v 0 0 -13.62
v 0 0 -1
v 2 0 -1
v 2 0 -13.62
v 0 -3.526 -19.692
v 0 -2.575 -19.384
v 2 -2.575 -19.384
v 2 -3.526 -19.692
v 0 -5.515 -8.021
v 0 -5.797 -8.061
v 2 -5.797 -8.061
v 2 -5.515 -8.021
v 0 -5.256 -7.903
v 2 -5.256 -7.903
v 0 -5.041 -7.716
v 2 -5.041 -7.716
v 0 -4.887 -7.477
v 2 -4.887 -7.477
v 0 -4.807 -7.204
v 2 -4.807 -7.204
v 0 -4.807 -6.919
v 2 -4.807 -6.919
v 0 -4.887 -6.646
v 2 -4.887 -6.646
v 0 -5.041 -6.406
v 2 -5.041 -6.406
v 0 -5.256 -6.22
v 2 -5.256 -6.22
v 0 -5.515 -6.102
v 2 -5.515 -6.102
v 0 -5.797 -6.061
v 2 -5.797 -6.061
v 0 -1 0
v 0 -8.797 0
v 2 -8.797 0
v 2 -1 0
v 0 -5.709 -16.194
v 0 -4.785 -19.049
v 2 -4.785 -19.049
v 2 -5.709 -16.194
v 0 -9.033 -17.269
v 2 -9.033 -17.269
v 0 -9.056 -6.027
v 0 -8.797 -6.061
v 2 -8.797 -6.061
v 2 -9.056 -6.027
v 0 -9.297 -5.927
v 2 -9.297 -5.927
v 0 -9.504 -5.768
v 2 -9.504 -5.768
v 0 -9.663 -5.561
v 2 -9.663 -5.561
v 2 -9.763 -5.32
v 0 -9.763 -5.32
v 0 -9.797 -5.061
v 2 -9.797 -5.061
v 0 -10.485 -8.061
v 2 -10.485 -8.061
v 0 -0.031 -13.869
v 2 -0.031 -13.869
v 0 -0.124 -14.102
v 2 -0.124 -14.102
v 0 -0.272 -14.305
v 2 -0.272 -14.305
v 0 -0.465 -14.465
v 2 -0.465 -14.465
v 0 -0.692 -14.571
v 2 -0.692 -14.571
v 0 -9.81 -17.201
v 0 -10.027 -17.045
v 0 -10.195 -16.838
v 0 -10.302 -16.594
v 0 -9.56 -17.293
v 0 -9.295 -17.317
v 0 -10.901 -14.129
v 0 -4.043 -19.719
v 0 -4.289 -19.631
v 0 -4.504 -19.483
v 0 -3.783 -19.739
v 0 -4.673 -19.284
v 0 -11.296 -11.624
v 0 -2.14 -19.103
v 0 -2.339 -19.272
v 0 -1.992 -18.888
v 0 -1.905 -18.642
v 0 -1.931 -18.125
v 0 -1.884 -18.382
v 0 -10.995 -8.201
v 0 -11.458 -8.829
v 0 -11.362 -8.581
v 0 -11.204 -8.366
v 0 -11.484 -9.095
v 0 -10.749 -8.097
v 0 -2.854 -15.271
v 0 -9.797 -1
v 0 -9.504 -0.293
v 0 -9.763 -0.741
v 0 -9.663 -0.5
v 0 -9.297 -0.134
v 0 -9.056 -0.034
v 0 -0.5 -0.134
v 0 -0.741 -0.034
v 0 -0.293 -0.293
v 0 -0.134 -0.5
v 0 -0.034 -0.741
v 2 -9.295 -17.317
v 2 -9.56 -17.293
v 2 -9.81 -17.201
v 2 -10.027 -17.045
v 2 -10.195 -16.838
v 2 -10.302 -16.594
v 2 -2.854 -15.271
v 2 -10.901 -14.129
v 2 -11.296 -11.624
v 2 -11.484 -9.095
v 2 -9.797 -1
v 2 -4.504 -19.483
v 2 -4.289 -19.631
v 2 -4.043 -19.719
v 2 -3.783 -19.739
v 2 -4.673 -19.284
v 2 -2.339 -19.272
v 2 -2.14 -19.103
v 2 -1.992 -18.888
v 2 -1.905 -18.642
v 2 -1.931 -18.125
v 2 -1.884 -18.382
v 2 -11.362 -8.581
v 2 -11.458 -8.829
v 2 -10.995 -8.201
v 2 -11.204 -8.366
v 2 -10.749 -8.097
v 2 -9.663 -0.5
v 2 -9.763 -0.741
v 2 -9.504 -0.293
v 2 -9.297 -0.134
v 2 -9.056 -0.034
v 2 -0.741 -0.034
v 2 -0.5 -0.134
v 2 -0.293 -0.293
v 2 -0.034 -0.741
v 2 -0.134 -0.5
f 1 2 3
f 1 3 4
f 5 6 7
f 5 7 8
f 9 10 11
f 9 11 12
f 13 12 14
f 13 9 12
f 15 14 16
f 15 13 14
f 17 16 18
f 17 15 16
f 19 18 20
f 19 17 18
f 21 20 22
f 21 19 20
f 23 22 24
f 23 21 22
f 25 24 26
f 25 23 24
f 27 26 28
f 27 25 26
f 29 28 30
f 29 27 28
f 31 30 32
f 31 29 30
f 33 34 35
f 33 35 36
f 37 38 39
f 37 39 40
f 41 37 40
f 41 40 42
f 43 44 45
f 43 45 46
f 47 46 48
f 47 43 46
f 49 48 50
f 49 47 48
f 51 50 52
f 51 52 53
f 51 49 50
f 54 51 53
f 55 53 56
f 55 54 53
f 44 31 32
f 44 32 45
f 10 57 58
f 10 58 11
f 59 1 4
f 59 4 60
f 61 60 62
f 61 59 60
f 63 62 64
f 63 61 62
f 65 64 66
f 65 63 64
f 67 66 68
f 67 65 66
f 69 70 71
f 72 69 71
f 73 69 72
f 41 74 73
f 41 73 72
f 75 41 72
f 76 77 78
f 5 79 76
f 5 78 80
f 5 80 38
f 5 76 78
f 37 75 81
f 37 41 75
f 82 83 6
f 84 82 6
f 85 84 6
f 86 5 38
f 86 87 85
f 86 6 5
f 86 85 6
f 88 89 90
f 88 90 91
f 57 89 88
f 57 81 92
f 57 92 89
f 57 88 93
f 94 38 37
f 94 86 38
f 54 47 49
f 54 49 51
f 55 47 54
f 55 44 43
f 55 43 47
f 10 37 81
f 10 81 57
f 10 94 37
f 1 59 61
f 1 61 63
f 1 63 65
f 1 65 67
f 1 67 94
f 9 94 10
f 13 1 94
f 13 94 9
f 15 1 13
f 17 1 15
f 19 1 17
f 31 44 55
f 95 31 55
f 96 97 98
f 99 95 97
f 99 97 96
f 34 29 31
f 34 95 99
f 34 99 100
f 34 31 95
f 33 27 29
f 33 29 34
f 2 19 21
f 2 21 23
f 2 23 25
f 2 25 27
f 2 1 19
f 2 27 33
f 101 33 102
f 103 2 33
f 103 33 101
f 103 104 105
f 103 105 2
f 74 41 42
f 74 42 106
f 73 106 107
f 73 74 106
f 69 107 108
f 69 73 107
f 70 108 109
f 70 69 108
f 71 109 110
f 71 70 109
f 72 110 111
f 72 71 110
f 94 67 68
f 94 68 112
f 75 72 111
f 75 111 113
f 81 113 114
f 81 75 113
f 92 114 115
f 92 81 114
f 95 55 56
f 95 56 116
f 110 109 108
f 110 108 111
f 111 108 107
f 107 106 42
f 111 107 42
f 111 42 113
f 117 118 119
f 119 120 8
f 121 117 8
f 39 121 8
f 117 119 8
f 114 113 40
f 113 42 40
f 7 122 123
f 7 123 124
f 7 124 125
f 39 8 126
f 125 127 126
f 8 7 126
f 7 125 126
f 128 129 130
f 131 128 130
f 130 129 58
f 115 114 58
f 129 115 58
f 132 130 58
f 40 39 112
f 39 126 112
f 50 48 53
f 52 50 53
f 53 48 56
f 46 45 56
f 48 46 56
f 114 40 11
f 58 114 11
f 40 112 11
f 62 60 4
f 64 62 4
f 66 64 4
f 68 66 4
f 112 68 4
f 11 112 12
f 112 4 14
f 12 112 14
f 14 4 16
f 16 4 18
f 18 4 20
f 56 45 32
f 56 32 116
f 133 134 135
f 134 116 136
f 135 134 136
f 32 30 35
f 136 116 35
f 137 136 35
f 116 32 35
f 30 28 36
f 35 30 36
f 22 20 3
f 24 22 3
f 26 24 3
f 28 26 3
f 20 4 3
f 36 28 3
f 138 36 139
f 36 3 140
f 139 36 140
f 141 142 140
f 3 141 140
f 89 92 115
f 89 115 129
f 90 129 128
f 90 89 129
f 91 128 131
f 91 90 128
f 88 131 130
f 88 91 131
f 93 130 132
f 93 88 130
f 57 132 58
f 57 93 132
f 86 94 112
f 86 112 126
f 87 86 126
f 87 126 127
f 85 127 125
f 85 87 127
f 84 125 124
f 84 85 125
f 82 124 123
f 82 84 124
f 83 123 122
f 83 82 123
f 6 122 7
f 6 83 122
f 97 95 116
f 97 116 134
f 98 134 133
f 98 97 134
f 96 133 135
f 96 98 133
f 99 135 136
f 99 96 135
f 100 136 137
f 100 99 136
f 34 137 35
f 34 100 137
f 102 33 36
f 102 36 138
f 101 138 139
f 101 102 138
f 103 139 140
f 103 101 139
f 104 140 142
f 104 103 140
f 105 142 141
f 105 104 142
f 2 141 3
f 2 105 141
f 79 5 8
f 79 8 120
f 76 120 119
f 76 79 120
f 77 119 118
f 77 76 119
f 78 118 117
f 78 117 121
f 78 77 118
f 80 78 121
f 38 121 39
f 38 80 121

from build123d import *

# Parameters (mm, degrees)
RESSALTO_EXTRUS_O1_DEPTH = 2


with BuildPart() as part:
    # Esboço1 → Ressalto-extrusão1 (new body)
    with BuildSketch(Plane(origin=(0, 0, 0), x_dir=(0, 0, -1), z_dir=(1, 0, 0))):
        with BuildLine():
            Line((1, 0), (13.619955174, 0))
            ThreePointArc((13.619955174, 0), (14.20826651, -0.191365489), (14.571412872, -0.692220455))
            Line((14.571412872, -0.692220455), (15.270830572, -2.854373095))
            Line((15.270830572, -2.854373095), (18.125203668, -1.931034461))
            ThreePointArc((18.125203668, -1.931034461), (18.8881324, -1.992076966), (19.384440911, -2.574712615))
            Line((19.384440911, -2.574712615), (19.692220455, -3.526170314))
            ThreePointArc((19.692220455, -3.526170314), (19.631177951, -4.289099046), (19.048542302, -4.785407557))
            Line((19.048542302, -4.785407557), (16.194169206, -5.708746191))
            Line((16.194169206, -5.708746191), (17.269391177, -9.032645519))
            ThreePointArc((17.269391177, -9.032645519), (17.200620929, -9.810385556), (16.593756544, -10.301633488))
            ThreePointArc((16.593756544, -10.301633488), (12.880660395, -11.123916543), (9.094724575, -11.484364042))
            ThreePointArc((9.094724575, -11.484364042), (8.366122719, -11.203742859), (8.061318263, -10.484922189))
            Line((8.061318263, -10.484922189), (8.061318263, -5.79672436))
            ThreePointArc((8.061318263, -5.79672436), (7.061318263, -4.79672436), (6.061318263, -5.79672436))
            Line((6.061318263, -5.79672436), (6.061318263, -8.79672436))
            ThreePointArc((6.061318263, -8.79672436), (5.768425044, -9.503831141), (5.061318263, -9.79672436))
            Line((5.061318263, -9.79672436), (1, -9.79672436))
            ThreePointArc((1, -9.79672436), (0.292893219, -9.503831141), (0, -8.79672436))
            Line((0, -8.79672436), (0, -1))
            ThreePointArc((0, -1), (0.292893219, -0.292893219), (1, 0))
        make_face()
    extrude(amount=RESSALTO_EXTRUS_O1_DEPTH)


solid = part.part
